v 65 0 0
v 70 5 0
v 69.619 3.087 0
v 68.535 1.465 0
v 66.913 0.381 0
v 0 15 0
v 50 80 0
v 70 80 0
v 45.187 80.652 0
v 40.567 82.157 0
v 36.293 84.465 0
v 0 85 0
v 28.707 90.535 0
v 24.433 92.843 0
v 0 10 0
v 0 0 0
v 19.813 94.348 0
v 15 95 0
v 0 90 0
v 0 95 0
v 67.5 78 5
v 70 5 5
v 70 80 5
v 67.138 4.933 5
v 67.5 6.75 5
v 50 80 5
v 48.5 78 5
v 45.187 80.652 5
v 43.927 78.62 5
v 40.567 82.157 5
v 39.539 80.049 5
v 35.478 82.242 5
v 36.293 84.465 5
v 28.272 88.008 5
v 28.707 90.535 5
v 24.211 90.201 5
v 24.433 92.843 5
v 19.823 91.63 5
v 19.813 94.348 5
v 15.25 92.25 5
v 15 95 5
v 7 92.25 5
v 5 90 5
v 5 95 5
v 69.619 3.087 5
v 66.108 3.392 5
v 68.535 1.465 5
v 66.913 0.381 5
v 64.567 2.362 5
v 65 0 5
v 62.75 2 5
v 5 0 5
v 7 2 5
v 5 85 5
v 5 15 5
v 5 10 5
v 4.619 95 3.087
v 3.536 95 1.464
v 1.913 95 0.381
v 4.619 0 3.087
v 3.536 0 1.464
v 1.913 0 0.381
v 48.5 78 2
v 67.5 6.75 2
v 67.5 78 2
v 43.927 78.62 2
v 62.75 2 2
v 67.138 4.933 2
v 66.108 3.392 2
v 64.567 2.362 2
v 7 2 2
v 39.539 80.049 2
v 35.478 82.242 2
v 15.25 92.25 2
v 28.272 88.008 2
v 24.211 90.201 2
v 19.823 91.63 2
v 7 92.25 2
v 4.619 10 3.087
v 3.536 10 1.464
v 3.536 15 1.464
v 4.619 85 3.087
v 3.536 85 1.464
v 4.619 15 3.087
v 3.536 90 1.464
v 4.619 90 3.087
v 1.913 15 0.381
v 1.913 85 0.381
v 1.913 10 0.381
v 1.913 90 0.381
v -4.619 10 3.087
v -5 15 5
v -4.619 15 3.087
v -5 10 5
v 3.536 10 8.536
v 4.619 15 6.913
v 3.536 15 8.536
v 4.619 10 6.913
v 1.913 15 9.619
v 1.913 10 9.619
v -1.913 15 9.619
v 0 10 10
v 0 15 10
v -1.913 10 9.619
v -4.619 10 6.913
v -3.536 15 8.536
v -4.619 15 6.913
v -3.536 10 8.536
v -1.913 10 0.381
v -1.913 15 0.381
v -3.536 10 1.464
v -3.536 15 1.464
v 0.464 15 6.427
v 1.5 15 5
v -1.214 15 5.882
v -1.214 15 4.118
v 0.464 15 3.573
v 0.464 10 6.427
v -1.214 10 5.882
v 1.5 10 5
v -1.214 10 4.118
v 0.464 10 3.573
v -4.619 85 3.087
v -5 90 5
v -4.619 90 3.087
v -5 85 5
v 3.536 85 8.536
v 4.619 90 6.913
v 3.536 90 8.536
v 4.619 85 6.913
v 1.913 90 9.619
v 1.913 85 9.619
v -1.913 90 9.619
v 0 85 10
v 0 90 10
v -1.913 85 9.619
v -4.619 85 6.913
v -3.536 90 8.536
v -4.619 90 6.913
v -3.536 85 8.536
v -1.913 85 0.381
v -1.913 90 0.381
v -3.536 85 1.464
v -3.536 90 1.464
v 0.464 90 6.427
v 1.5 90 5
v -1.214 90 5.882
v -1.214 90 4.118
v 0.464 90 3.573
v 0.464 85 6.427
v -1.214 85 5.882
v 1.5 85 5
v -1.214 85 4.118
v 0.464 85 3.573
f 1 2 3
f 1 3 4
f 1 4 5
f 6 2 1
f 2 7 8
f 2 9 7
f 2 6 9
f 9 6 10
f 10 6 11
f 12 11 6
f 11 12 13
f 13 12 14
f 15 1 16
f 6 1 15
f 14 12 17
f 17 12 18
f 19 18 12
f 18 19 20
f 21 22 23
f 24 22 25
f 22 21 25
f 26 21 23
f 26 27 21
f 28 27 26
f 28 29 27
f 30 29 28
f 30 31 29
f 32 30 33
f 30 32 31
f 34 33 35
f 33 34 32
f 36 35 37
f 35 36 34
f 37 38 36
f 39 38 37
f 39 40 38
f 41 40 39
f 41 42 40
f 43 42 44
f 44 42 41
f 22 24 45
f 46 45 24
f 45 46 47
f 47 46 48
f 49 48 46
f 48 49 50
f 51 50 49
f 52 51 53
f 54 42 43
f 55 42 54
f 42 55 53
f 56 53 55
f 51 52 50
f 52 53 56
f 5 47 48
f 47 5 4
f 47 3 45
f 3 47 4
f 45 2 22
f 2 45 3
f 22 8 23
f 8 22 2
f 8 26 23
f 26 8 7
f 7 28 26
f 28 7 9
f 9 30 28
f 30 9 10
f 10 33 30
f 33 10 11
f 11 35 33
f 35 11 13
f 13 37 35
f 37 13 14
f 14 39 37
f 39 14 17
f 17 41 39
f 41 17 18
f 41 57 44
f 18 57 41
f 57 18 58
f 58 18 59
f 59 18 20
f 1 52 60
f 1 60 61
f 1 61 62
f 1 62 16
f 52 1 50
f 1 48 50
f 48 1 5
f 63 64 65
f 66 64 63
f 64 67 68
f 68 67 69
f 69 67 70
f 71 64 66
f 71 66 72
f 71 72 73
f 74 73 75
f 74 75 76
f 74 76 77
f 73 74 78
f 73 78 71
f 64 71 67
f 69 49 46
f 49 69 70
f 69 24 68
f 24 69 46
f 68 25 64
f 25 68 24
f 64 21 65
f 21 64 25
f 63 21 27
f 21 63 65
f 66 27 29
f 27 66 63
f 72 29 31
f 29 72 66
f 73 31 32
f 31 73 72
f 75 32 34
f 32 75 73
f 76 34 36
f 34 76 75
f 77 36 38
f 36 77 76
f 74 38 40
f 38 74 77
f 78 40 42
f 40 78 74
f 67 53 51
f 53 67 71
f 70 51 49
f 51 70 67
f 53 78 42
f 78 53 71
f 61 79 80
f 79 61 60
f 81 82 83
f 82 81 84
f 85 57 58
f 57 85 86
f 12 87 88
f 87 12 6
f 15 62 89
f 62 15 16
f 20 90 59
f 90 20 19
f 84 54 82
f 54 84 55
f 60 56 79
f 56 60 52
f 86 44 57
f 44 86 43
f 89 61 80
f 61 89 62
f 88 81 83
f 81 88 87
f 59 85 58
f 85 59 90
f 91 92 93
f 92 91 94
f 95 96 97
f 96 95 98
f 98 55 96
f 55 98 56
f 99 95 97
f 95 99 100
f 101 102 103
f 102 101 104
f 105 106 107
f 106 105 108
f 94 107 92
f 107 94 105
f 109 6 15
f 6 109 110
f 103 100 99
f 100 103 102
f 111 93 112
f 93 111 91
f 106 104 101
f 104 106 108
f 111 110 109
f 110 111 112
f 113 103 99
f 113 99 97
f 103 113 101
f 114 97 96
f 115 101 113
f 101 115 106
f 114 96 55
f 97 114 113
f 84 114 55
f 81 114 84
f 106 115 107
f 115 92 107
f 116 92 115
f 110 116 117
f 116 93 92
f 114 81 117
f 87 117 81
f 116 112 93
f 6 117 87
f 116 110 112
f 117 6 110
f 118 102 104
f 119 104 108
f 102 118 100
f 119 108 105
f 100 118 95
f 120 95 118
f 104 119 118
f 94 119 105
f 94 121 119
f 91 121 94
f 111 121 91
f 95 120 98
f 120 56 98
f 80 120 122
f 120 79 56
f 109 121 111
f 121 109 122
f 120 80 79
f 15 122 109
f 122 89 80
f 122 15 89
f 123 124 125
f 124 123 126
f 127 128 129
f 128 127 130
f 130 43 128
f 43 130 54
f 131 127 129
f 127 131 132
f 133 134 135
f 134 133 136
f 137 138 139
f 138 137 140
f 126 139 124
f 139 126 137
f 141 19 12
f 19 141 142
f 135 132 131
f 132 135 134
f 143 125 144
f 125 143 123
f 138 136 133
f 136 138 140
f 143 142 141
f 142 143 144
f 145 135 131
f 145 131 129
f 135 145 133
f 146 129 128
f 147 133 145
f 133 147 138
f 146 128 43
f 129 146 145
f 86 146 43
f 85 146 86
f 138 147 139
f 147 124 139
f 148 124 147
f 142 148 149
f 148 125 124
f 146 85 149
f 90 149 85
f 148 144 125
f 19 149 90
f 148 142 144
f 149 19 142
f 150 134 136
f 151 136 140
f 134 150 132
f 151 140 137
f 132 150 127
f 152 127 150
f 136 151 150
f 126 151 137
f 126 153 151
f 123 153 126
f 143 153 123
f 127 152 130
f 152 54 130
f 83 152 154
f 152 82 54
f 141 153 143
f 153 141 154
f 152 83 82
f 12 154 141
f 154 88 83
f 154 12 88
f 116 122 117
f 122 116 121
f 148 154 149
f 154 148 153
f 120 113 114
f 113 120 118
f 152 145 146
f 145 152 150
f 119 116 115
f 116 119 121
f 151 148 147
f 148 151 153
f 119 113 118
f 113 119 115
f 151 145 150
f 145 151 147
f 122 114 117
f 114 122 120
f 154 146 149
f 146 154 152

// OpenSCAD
module rightpanel(){
linear_extrude(height =5)
import("PrintableRight.dxf");
}

module rightpanelblank(){
difference(){
rightpanel();
translate(v=[1,2,2])
scale(0.95)
rightpanel();
}
cube(size=[7,95,5]);
}

module hingedpanel(){
difference(){
rightpanelblank();
rotate(a=[90,0,0])
translate(v=[0,5,-47.5])
cylinder(r=5,h=100,center=true);
}

rotate(a=[90,0,0])
translate(v=[0,5,-12.5])
cylinder(r=5,h=5,center=true);

rotate(a=[90,0,0])
translate(v=[0,5,-87.5])
cylinder(r=5,h=5,center=true);
}

difference(){
hingedpanel();
rotate(a=[90,0,0])
translate(v=[0,5,-47.5])
cylinder(r=1.5,h=100,center=true);
}
